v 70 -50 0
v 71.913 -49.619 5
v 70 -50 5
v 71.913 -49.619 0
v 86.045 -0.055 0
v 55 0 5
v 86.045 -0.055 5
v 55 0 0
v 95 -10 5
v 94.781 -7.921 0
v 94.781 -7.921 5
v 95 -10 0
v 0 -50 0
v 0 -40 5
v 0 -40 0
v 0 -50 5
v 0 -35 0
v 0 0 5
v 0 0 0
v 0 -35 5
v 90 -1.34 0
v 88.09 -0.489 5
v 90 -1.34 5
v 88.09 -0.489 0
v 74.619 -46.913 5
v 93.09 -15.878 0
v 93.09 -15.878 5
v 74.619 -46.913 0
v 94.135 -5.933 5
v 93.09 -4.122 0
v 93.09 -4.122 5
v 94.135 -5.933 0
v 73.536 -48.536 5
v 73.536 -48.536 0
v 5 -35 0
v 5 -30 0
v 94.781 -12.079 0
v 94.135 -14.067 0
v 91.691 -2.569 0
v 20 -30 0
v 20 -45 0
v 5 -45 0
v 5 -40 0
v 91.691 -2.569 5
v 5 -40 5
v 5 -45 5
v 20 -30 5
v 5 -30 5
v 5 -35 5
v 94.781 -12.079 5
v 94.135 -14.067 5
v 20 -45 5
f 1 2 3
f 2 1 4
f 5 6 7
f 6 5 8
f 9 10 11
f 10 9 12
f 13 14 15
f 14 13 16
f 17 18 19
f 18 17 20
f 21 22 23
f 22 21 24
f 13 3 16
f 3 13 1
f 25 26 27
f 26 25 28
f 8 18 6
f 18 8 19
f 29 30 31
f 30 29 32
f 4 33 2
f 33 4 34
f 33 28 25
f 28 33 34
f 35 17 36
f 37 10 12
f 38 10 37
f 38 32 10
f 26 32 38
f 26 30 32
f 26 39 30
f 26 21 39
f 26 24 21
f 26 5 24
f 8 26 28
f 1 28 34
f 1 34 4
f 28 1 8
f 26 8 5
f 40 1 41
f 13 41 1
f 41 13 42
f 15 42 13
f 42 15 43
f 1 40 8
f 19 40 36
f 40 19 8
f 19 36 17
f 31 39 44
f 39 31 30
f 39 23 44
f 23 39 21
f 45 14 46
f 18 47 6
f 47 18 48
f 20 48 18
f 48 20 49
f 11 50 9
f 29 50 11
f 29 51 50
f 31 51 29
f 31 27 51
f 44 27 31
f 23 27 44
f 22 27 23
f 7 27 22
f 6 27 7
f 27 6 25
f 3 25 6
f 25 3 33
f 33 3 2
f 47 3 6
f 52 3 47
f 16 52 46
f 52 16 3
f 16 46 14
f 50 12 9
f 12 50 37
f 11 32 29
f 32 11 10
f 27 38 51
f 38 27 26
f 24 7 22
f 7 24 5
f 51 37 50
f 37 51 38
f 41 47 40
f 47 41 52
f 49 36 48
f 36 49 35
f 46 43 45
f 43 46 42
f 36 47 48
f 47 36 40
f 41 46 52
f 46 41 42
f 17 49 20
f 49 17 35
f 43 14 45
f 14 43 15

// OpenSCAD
// file: Rig.scad
// Roller Project Part #1 Front Bracket
include <Settings.scad>;

rig();

module rig(){
//plate
translate( v= [-PlateWidth/2,-PlateDepth/2,-PlateHeight]){
	color("red") cube(size=[PlateWidth,PlateDepth,PlateHeight]);
}

//arm
translate( v= [-BaseWidth/2-ArmWidth,-PlateDepth/2-ArmForwardProjection,-ArmVOffset-ArmHeight]){
	color("DarkSlateGray") cube(size=[ArmWidth,PlateDepth+ArmForwardProjection+ArmRearProjection,ArmHeight]);
}

//arm
translate( v= [BaseWidth/2,-PlateDepth/2-ArmForwardProjection,-ArmVOffset-ArmHeight]){
	color("DarkSlateGray")  cube(size=[ArmWidth,PlateDepth+ArmForwardProjection+ArmRearProjection,ArmHeight]);
}

//base
translate( v= [-BaseWidth/2,-PlateDepth/2-BaseForwardProjection,-BaseVOffset-BaseHeight]){
	color("DarkKhakicube") cube (size=[BaseWidth,PlateDepth+BaseForwardProjection+BaseRearProjection,BaseHeight]);
}
}
// file: Settings.scad
// Mesurements Of Platform Actual & Global Settings

// Mesurements ACTUAL

PlateWidth = 200;
PlateDepth = 150;
PlateHeight = 8;

ArmWidth = 15;
ArmHeight = 15;
ArmForwardProjection = 20;
ArmRearProjection = 50;
ArmVOffset = 30;

BaseWidth = 100;
BaseHeight = 5;
BaseForwardProjection = 10;
BaseRearProjection = 10;
BaseVOffset = 35;

BaseDeflectorLength = 20;
BaseDeflectorAngle = 45;

ScrewsWidthOutset = 5;
ScrewsDepthOutset = 5;

RearPlugWidth = 10;
RearPlugHeight = 5;
RearPlugVOffset = 1;

// Options
d = 0.01;


ClipSticksize = 5;
PlateThickness = 5;
UpperRollerProjection  = 40;
UpperRollerRadius = 10;

LowerRollerProjection = 20;
LowerRollerRadius = 5;


// Calculated


PlateArmOverhang = PlateWidth/2 - BaseWidth/2  - ArmWidth; 
// main file
// Roller Project Part #1 Front Bracket

include <Settings.scad>;
use <Rig.scad>;

//rig();
FrontRightPlate();

module FrontRightPlate(){
difference(){
hull(){
translate(v = [0,-(ArmVOffset+ArmHeight+ClipSticksize),0]){
	color("red") cube(size = [ClipSticksize+ArmWidth+PlateArmOverhang,ArmHeight+ClipSticksize+ArmVOffset,PlateThickness]);
}

translate(v = [ClipSticksize+ArmWidth+PlateArmOverhang+UpperRollerProjection-UpperRollerRadius,-UpperRollerRadius,0]){
	cylinder(h= PlateThickness ,r = UpperRollerRadius); 
}

translate(v = [ClipSticksize+ArmWidth+PlateArmOverhang+LowerRollerProjection-LowerRollerRadius,-(ArmVOffset+ArmHeight+ClipSticksize)+LowerRollerRadius,0]){
	cylinder(h= PlateThickness ,r = LowerRollerRadius); 
}
}

translate(v = [ClipSticksize,-ArmVOffset-ArmHeight,-d]){
	cube(size = [ArmWidth,ArmHeight,PlateThickness+2*d]);
}


translate(v = [0,-BaseVOffset-BaseHeight,-d]){
cube(size = [ClipSticksize,BaseHeight,PlateThickness+2*d]);
}

}
}
